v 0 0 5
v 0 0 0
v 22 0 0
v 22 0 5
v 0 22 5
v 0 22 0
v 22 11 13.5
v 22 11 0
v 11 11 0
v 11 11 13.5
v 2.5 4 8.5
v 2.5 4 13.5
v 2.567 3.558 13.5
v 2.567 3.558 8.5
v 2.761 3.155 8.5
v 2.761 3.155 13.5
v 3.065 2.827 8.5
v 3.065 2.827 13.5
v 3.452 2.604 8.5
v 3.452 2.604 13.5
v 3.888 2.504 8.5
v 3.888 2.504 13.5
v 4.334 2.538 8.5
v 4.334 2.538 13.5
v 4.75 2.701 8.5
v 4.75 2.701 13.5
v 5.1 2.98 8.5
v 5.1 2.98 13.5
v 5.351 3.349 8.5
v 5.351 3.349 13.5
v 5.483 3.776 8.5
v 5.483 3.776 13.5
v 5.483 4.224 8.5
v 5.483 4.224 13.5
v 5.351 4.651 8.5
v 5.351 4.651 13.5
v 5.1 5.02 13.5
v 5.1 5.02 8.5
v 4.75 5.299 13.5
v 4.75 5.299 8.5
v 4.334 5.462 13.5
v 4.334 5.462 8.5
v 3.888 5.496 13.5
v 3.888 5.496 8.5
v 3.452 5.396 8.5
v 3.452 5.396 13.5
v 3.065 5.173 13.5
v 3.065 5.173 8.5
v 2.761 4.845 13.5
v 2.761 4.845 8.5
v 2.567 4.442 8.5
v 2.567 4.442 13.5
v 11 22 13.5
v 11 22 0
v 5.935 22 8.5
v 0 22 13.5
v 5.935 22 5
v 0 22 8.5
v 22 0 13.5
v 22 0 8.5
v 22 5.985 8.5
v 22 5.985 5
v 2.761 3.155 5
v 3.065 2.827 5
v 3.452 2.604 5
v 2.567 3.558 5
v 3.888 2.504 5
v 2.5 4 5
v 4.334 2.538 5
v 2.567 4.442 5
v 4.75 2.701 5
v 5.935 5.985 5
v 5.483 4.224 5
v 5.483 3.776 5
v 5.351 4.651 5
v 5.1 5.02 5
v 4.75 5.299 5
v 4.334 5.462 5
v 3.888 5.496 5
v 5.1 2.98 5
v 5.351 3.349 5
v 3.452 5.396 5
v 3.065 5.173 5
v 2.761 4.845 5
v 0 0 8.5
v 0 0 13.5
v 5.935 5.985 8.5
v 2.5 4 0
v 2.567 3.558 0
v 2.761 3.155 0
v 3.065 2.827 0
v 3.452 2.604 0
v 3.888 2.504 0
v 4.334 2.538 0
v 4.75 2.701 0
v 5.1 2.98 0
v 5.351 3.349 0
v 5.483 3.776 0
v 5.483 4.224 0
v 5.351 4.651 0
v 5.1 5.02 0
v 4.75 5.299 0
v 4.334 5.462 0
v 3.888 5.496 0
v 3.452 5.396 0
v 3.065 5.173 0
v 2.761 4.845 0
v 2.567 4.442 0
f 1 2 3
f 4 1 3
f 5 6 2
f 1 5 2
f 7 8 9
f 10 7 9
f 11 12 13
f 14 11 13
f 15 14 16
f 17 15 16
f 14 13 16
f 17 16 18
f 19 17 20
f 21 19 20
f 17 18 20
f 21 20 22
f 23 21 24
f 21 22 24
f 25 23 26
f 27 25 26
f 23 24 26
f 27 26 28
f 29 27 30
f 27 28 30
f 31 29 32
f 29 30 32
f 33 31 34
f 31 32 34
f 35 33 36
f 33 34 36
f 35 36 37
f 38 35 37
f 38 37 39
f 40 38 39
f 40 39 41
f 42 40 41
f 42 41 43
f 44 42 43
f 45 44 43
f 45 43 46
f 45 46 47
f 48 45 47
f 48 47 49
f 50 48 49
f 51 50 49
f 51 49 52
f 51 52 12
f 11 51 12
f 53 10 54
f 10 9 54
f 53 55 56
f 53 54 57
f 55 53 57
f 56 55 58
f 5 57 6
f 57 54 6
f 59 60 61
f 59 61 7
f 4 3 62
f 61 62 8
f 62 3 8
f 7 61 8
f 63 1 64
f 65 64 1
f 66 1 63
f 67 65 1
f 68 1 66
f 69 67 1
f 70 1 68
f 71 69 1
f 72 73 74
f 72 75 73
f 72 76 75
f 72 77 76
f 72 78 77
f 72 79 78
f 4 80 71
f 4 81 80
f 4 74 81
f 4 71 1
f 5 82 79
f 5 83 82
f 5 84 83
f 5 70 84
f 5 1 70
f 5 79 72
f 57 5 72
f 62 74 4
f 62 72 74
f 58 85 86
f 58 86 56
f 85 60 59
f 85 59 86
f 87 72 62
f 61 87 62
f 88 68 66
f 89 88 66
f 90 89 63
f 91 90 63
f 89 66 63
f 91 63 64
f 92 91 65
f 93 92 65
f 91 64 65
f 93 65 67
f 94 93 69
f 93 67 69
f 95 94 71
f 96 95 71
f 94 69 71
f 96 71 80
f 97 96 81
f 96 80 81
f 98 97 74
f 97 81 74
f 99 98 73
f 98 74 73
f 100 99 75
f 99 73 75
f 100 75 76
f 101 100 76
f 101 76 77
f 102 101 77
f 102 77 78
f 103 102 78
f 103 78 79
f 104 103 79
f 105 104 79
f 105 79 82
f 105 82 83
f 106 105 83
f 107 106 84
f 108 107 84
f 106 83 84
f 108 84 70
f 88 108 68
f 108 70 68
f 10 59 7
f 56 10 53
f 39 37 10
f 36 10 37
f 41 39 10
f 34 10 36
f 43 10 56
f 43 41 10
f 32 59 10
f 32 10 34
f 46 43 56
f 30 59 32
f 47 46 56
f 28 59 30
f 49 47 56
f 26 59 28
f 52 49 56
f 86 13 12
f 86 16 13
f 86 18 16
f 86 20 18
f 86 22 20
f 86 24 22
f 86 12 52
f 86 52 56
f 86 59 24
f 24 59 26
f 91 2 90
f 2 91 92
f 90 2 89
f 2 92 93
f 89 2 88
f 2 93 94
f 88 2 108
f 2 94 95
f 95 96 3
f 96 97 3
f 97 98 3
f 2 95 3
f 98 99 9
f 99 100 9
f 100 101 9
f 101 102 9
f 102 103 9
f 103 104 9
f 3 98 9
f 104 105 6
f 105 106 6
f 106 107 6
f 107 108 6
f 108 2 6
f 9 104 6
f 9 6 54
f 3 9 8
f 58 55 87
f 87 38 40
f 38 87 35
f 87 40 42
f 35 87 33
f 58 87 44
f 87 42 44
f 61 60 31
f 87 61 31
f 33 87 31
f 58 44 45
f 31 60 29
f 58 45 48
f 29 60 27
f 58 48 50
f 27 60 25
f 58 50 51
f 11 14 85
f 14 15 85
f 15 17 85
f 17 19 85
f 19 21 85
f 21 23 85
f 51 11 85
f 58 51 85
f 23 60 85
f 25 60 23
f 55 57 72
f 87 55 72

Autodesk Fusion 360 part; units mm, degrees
sketch "Sketch1" plane through (0, 0, 0) normal (0, 0, 1) x (1, 0, 0)
  line L0 (0, 0) -> (11, 0)
  line L1 (11, 0) -> (11, 22)
  line L2 (11, 22) -> (0, 22)
  line L3 (0, 22) -> (0, 0)
  line L4 (11, 0) -> (22, 0)
  line L5 (22, 0) -> (22, 11)
  line L6 (22, 11) -> (11, 11)
  line L7 (11, 11) -> (11, 0)
  dimension "d1" = 11
  dimension "d2" = 22
  dimension "d3" = 11
  dimension "d4" = 11
extrude "Extrude1" add sketch "Sketch1" along normal blind 5
sketch "Sketch2" plane through (0, 0, 5) normal (0, 0, 1) x (-1, 0, 0)
  line L0 (-22, -11) -> (-11, -11)
  line L1 (-11, -11) -> (-11, -22)
  line L2 (-11, -22) -> (0, -22)
  line L3 (0, -22) -> (0, 0)
  line L4 (0, 0) -> (-22, 0)
  line L5 (-22, 0) -> (-22, -11)
  line L6 (-22, -11) -> (-5.9353, -11)
  line L7 (-5.9353, -11) -> (-5.9353, -5.9846)
  line L8 (-5.9353, -5.9846) -> (-22, -5.9846)
  line L9 (-22, -5.9846) -> (-22, -11)
  line L10 (-5.9353, -22) -> (-11, -22)
  line L11 (-11, -22) -> (-11, -11)
  line L12 (-11, -11) -> (-5.9353, -11)
  line L13 (-5.9353, -11) -> (-5.9353, -22)
extrude "Extrude2" add sketch "Sketch2" along normal blind 3.5 contours L0 L5 L6 L7 L8 L9 L12 | L1 L2 L6 L10 L11 L12 L13
sketch "Sketch3" plane through (0, 0, 8.5) normal (0, 0, 1) x (-1, 0, 0)
  line L0 (-5.9353, -5.9846) -> (-22, -5.9846)
  line L1 (-22, -5.9846) -> (-22, -11)
  line L2 (-22, -11) -> (-11, -11)
  line L3 (-11, -11) -> (-11, -22)
  line L4 (-11, -22) -> (-5.9353, -22)
  line L5 (-5.9353, -22) -> (-5.9353, -5.9846)
  line L6 (0, -22) -> (-11, -22)
  line L7 (-11, -22) -> (-11, 0)
  line L8 (-11, 0) -> (0, 0)
  line L9 (0, 0) -> (0, -22)
  line L10 (-11, -11) -> (-22, -11)
  line L11 (-22, -11) -> (-22, 0)
  line L12 (-22, 0) -> (-11, 0)
  line L13 (-11, 0) -> (-11, -11)
extrude "Extrude3" add sketch "Sketch3" along normal blind 5
sketch "Sketch4" plane through (0, 0, 13.5) normal (0, 0, 1) x (-1, 0, 0)
  line L0 (-22, 0) -> (-22, -11)
  line L1 (-22, -11) -> (-11, -11)
  line L2 (-11, -11) -> (-11, -22)
  line L3 (-11, -22) -> (0, -22)
  line L4 (0, -22) -> (0, 0)
  line L5 (0, 0) -> (-22, 0)
  circle A0 centre (-4, -4) radius 1.5
  dimension "d11" = 3
extrude "Extrude4" cut sketch "Sketch4" against normal blind 17 contours A0
